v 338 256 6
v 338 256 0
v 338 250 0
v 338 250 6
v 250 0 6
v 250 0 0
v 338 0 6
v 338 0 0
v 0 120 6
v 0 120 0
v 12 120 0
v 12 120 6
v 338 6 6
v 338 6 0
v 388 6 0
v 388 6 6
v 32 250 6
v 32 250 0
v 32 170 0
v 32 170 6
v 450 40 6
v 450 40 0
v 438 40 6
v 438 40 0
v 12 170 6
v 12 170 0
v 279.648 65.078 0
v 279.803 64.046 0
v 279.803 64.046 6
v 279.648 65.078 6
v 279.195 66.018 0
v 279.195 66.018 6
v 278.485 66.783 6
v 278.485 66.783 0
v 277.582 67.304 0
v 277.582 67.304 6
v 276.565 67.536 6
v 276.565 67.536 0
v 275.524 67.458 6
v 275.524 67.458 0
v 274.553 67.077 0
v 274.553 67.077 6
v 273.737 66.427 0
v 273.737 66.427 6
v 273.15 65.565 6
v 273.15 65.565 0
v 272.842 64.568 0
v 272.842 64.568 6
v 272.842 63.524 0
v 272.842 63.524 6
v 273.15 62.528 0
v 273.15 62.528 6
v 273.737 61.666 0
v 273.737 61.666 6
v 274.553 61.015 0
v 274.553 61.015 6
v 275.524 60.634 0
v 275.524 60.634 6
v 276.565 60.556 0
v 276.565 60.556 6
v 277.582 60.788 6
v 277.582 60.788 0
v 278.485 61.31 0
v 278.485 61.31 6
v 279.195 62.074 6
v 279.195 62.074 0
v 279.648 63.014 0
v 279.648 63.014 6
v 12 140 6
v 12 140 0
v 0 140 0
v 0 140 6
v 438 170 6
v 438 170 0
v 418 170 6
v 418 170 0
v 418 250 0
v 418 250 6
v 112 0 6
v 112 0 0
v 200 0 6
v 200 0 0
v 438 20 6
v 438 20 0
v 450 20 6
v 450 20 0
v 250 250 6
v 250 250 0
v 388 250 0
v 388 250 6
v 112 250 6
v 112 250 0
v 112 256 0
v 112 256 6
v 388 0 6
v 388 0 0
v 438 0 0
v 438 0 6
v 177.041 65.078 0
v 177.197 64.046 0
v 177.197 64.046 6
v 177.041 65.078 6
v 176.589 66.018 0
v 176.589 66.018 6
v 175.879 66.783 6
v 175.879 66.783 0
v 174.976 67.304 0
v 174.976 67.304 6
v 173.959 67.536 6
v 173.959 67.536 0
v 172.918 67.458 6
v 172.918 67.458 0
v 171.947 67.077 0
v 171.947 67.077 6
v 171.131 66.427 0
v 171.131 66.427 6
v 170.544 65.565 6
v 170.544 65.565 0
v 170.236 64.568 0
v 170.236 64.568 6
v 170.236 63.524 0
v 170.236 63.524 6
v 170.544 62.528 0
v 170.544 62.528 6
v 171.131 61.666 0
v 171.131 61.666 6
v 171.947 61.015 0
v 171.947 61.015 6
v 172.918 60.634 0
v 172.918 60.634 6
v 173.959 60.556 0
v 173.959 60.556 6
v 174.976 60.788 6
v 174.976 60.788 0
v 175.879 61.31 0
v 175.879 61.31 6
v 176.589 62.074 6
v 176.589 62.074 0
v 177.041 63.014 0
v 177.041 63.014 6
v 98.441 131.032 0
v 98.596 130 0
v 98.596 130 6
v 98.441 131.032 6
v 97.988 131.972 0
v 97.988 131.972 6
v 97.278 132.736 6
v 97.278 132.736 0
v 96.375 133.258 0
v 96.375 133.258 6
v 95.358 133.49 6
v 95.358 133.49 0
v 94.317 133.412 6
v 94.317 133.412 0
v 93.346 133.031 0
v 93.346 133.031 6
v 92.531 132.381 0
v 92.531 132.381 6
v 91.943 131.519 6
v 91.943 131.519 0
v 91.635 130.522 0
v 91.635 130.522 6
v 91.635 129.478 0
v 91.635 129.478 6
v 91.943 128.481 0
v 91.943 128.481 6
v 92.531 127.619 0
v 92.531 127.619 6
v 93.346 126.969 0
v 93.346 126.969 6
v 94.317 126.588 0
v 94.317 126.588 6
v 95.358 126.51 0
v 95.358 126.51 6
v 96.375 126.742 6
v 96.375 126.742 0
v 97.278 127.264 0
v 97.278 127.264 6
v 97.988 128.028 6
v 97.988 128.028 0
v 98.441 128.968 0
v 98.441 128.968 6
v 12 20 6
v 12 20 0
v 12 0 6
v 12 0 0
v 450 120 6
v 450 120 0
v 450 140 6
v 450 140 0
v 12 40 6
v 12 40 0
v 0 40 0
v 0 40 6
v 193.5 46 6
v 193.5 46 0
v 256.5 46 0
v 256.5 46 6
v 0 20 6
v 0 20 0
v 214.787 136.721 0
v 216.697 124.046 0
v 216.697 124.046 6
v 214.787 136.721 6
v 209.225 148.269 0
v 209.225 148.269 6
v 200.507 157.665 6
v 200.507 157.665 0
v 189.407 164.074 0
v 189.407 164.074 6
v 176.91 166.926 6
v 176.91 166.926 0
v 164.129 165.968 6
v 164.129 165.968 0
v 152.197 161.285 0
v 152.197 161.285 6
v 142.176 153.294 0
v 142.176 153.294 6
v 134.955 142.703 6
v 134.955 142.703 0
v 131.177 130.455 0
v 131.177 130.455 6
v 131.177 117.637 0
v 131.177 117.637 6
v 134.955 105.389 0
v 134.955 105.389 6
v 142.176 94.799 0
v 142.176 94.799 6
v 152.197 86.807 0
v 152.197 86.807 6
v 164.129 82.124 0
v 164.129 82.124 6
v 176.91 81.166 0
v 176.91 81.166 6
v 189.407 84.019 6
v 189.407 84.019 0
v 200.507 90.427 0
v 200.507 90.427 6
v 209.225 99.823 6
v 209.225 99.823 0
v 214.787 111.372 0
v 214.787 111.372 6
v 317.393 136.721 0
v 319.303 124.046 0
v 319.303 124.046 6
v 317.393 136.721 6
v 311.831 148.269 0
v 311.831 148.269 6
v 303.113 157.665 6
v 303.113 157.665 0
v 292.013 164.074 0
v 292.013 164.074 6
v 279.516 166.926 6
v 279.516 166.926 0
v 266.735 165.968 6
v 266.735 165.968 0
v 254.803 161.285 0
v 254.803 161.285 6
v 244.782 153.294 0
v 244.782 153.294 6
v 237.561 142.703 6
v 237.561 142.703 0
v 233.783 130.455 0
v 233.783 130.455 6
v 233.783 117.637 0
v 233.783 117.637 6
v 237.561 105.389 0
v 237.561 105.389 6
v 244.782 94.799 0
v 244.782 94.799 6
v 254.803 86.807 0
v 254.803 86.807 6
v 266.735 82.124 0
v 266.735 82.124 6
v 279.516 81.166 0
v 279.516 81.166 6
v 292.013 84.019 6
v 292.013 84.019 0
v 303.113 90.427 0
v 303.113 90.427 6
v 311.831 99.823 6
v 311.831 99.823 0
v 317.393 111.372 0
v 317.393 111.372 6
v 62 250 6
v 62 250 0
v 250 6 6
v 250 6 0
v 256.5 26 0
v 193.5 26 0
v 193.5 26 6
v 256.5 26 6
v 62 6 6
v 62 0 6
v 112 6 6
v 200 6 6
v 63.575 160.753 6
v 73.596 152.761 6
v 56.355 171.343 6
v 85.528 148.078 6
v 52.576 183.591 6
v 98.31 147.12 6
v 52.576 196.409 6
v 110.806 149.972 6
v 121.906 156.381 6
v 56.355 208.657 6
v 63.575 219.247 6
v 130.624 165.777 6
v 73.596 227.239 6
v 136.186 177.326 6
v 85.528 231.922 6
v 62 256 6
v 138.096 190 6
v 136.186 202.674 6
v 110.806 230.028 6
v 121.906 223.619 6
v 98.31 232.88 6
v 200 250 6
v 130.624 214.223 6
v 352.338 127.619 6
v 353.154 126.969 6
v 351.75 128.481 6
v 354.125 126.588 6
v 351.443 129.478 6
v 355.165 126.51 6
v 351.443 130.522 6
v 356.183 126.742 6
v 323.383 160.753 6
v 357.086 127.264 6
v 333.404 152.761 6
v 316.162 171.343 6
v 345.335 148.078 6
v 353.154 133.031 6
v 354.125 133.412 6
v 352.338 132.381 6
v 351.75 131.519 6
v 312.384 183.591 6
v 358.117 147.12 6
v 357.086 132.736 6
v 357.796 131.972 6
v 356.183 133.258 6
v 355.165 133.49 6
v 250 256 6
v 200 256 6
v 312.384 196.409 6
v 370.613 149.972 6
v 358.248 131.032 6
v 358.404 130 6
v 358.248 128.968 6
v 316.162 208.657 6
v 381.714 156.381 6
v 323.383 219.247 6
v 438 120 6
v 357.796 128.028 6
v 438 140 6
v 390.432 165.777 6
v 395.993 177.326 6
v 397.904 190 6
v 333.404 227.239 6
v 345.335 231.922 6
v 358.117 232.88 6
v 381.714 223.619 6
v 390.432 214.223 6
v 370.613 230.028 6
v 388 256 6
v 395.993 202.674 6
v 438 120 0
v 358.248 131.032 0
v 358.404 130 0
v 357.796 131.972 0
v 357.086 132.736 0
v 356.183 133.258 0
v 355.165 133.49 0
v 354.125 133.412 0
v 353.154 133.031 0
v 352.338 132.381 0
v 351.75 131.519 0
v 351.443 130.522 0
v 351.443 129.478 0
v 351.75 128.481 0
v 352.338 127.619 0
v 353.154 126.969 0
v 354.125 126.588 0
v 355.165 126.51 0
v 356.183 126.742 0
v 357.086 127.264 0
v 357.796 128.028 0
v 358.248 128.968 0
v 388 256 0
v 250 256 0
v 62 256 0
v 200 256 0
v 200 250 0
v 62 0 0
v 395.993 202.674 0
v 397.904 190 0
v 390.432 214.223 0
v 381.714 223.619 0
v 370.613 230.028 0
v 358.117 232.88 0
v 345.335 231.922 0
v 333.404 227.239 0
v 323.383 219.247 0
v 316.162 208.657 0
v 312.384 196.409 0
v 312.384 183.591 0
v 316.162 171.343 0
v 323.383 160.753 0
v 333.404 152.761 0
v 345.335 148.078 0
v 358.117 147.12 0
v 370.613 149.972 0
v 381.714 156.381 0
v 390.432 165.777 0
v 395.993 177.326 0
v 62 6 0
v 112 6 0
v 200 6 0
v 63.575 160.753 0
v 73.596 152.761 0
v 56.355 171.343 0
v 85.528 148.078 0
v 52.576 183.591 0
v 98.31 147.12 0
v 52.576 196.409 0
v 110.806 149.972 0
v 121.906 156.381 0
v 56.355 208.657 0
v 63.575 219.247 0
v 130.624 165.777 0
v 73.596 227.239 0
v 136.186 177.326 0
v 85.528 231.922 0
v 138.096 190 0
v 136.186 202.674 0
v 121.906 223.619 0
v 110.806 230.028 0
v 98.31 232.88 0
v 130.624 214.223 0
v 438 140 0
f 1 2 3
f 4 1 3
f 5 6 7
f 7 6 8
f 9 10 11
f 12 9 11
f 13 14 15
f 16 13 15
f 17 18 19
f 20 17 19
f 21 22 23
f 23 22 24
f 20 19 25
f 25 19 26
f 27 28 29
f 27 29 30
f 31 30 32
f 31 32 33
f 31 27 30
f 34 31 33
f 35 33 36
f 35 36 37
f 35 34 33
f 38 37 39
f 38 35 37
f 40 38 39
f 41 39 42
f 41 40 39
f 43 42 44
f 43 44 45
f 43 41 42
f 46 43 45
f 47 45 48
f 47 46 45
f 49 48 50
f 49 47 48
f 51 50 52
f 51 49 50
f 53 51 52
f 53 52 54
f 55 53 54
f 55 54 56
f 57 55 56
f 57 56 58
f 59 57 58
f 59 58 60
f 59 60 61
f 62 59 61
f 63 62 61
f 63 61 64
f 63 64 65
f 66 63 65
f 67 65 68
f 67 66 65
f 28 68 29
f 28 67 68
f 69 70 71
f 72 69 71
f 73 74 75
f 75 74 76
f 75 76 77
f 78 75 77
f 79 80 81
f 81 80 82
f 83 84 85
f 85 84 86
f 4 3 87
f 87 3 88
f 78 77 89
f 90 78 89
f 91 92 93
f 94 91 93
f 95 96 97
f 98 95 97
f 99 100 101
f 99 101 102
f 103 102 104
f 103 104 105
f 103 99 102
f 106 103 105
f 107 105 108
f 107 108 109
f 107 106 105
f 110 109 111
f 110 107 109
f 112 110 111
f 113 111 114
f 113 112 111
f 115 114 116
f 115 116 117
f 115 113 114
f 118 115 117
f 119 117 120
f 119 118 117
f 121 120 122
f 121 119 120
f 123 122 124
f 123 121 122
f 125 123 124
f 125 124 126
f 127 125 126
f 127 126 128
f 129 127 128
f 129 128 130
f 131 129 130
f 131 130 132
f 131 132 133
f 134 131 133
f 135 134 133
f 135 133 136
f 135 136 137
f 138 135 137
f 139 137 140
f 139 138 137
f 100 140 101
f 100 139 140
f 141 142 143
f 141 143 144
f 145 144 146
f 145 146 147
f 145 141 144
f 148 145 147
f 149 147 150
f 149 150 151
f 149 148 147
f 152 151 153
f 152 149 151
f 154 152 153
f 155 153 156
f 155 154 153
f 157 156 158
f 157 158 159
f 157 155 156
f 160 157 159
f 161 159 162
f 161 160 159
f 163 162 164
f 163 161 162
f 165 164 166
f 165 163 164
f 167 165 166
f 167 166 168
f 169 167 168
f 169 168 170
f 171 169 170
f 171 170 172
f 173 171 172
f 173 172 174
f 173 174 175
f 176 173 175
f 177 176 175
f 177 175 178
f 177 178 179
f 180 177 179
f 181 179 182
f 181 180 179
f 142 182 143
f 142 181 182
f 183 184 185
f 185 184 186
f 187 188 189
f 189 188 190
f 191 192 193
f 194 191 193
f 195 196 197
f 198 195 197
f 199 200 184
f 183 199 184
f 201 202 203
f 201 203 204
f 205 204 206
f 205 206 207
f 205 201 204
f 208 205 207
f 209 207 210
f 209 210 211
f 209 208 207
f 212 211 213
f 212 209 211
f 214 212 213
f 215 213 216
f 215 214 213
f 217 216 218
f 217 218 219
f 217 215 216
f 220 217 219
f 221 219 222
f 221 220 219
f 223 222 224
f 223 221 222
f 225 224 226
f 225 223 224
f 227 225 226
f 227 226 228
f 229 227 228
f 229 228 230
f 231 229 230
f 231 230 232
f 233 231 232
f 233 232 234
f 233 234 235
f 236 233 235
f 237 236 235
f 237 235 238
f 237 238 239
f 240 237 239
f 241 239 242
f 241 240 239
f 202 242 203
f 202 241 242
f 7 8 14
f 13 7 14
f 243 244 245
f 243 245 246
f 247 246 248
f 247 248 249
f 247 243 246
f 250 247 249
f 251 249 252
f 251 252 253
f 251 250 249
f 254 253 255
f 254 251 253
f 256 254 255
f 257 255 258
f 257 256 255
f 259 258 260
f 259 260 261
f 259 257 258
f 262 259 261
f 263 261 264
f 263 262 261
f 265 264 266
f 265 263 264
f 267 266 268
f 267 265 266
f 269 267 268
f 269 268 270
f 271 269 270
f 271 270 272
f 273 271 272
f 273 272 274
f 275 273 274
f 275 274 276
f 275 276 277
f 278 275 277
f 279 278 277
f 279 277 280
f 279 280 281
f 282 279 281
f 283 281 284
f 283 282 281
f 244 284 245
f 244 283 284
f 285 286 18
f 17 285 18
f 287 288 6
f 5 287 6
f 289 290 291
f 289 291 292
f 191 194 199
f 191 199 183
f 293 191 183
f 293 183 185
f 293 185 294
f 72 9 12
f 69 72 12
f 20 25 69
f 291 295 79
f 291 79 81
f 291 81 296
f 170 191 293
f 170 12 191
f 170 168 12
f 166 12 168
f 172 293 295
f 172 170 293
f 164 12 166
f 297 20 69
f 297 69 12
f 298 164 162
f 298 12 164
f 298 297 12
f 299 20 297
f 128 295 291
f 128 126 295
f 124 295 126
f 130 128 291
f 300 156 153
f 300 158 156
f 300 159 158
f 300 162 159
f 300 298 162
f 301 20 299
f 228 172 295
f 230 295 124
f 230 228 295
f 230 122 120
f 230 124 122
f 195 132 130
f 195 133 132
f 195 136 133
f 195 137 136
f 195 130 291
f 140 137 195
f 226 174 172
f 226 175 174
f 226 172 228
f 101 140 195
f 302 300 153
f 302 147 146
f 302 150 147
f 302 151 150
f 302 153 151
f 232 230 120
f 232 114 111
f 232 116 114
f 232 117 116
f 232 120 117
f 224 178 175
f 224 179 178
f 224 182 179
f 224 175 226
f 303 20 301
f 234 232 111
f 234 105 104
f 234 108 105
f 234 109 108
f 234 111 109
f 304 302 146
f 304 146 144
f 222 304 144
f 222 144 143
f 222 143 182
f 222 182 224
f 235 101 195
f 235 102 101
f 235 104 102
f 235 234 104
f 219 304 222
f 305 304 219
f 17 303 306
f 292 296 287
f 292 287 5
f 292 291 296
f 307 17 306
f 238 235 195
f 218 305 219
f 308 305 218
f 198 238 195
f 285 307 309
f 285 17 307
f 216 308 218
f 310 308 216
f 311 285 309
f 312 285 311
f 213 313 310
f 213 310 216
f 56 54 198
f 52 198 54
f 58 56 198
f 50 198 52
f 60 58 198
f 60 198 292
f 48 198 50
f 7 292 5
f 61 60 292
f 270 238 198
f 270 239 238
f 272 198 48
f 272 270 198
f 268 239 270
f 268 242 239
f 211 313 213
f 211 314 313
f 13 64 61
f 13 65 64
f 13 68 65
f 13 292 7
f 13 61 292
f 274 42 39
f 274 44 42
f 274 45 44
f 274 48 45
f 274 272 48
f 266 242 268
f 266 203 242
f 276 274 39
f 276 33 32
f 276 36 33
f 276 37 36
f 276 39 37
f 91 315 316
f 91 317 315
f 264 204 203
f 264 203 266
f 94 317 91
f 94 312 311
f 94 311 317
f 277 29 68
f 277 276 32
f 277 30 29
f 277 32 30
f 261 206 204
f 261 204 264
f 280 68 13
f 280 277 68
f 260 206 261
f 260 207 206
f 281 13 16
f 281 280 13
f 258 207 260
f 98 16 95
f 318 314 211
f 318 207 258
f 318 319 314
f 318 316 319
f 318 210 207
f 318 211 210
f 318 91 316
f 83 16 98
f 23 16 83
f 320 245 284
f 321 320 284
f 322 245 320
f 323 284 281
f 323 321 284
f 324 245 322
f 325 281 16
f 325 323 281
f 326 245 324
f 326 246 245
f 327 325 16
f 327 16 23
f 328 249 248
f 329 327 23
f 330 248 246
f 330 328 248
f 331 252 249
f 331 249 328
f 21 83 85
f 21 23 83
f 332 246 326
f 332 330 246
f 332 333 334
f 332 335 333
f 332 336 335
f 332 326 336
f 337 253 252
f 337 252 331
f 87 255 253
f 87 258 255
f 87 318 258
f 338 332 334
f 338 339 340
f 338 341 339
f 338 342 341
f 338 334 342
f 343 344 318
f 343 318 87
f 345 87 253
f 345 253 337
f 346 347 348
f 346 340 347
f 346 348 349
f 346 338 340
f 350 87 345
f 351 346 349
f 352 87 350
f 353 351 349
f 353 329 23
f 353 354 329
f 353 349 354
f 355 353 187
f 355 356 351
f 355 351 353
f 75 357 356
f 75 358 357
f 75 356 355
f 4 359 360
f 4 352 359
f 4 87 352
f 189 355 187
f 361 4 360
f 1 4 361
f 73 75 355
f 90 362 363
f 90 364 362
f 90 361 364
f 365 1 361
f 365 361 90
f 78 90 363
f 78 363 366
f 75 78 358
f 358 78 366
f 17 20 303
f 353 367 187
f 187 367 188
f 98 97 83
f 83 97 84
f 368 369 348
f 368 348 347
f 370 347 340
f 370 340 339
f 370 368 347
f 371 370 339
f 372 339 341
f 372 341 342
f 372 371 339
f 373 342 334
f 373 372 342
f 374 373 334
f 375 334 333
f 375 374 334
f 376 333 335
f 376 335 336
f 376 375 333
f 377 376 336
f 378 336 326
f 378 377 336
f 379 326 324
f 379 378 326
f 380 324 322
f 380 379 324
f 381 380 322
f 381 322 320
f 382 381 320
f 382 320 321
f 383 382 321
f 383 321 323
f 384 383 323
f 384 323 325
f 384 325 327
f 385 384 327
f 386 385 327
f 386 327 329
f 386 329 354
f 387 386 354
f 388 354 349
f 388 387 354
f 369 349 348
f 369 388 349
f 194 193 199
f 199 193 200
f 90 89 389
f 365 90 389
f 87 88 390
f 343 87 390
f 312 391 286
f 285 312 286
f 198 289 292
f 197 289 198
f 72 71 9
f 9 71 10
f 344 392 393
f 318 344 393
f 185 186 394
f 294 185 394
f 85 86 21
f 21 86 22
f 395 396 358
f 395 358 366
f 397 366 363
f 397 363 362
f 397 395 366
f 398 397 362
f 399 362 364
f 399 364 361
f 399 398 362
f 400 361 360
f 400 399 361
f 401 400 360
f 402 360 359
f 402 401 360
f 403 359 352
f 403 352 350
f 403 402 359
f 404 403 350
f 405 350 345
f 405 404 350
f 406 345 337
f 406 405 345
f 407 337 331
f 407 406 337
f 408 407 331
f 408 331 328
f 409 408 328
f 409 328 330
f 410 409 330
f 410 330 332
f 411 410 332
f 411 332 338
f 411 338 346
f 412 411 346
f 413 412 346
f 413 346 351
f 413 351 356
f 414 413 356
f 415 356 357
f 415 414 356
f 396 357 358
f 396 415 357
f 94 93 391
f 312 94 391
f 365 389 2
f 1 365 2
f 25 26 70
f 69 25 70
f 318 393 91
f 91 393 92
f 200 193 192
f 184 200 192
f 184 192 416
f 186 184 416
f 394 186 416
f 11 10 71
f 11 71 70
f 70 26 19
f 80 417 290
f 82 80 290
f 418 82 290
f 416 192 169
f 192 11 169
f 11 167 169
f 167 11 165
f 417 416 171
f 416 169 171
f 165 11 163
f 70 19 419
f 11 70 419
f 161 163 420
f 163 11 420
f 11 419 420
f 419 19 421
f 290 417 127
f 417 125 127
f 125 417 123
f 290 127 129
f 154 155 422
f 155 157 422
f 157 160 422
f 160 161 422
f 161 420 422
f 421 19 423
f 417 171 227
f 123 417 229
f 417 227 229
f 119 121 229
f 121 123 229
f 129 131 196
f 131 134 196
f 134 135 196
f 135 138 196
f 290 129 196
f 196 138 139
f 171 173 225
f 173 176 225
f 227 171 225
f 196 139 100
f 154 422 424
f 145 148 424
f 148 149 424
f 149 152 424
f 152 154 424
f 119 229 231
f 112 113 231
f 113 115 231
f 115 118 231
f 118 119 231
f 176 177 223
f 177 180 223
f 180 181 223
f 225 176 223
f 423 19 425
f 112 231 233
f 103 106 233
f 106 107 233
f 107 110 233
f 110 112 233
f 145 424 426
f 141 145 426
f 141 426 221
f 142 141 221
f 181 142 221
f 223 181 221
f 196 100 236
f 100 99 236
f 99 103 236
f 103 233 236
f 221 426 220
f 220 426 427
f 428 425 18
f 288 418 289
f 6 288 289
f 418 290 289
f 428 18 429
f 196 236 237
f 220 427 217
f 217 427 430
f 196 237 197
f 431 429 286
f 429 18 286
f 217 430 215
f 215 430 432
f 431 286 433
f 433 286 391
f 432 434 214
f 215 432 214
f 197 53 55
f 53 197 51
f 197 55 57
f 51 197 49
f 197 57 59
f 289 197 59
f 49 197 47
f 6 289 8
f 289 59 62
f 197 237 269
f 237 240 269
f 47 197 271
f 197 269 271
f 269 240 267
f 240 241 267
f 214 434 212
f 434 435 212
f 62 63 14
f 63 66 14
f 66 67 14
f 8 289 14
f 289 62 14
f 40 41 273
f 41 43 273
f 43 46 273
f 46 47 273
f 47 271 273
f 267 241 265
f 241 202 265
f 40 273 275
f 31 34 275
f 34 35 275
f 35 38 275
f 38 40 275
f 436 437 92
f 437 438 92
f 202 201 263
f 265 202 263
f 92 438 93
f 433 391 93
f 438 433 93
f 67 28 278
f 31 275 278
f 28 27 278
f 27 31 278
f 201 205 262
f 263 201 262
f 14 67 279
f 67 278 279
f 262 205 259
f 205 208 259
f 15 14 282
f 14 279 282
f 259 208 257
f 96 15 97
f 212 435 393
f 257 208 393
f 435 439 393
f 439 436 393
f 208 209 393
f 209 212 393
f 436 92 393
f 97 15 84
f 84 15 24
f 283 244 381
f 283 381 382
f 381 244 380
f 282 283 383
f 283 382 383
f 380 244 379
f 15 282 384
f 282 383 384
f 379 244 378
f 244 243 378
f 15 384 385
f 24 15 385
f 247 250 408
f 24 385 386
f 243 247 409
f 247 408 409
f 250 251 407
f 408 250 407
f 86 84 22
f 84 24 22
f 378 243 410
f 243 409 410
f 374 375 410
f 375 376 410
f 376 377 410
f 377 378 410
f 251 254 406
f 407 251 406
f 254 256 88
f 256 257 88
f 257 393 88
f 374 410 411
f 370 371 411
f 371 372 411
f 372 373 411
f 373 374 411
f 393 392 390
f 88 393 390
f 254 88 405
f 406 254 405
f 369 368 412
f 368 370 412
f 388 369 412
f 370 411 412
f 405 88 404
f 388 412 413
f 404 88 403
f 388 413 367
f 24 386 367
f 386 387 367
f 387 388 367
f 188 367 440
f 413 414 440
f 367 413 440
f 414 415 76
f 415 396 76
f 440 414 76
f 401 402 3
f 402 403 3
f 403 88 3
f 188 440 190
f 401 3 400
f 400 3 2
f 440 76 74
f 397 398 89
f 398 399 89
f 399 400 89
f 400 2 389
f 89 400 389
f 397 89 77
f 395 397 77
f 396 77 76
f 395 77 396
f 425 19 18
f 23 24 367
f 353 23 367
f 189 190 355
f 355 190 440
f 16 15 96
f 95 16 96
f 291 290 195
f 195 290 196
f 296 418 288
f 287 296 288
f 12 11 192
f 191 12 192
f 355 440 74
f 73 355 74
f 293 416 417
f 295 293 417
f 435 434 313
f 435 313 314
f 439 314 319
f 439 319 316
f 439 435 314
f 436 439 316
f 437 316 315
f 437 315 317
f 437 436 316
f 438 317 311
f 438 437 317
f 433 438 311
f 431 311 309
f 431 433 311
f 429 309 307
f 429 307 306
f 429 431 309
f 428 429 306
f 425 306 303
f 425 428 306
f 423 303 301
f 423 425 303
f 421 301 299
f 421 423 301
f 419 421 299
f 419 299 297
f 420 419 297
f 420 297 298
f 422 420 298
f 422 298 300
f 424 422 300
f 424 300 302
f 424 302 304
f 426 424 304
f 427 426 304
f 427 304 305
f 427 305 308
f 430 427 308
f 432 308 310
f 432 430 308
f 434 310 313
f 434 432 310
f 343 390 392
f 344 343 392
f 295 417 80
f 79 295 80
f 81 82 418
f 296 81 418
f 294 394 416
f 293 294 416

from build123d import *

# Parameters (mm, degrees)
SKETCH_1_R      = 43
SKETCH_1_R_2    = 3.5
SKETCH_1_W      = 63
SKETCH_1_H      = 20
EXTRUDE_2_DEPTH = 6


with BuildPart() as part:
    # Эскиз1 → Бобышка-Вытянуть2 (new body)
    with BuildSketch(Plane.XY):
        Polygon((450, 20), (450, 40), (438, 40), (438, 120), (450, 120), (450, 140), (438, 140), (438, 170), (418, 170), (418, 250), (388, 250), (388, 256), (338, 256), (338, 250), (250, 250), (250, 256), (200, 256), (200, 250), (112, 250), (112, 256), (62, 256), (62, 250), (32, 250), (32, 170), (12, 170), (12, 140), (0, 140), (0, 120), (12, 120), (12, 40), (0, 40), (0, 20), (12, 20), (12, 0), (62, 0), (62, 6), (112, 6), (112, 0), (200, 0), (200, 6), (250, 6), (250, 0), (338, 0), (338, 6), (388, 6), (388, 0), (438, 0), (438, 20), align=None)
        with Locations((95.096189432, 190)):
            Circle(SKETCH_1_R, mode=Mode.SUBTRACT)
        with Locations((173.696978501, 124.046106882)):
            Circle(SKETCH_1_R, mode=Mode.SUBTRACT)
        with Locations((276.303021499, 124.046106882)):
            Circle(SKETCH_1_R, mode=Mode.SUBTRACT)
        with Locations((354.903810568, 190)):
            Circle(SKETCH_1_R, mode=Mode.SUBTRACT)
        with Locations((95.096189432, 130)):
            Circle(SKETCH_1_R_2, mode=Mode.SUBTRACT)
        with Locations((173.696978501, 64.046106882)):
            Circle(SKETCH_1_R_2, mode=Mode.SUBTRACT)
        with Locations((276.303021499, 64.046106882)):
            Circle(SKETCH_1_R_2, mode=Mode.SUBTRACT)
        with Locations((354.903810568, 130)):
            Circle(SKETCH_1_R_2, mode=Mode.SUBTRACT)
        with Locations((225, 36)):
            Rectangle(SKETCH_1_W, SKETCH_1_H, mode=Mode.SUBTRACT)
    extrude(amount=EXTRUDE_2_DEPTH)


solid = part.part
